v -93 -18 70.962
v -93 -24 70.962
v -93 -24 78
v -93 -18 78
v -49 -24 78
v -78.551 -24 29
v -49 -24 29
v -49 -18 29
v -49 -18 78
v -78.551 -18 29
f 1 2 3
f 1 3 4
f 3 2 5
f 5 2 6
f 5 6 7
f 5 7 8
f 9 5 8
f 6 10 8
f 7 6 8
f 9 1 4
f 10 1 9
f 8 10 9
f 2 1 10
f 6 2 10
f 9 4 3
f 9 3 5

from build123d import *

# Parameters (mm, degrees)
BOX720_W               = 80
BOX720_H               = 6
BOX720_DEPTH           = 20
BOX720_PLACEMENT_ANGLE = 71
BOX727_W               = 44
BOX727_H               = 6
BOX727_DEPTH           = 49


with BuildPart() as krychle720:
    # Box720 → Box720 (new body)
    with BuildSketch(Plane.XY):
        with Locations((40, 3)):
            Rectangle(BOX720_W, BOX720_H)
    extrude(amount=BOX720_DEPTH)


with BuildPart() as krychle720_1:
    # Box720 placement: moved
    add(krychle720.part.moved(Location((-118.17, -24, 82.63))).rotate(Axis((-118.17, -24, 82.63), (0, 1, 0)), BOX720_PLACEMENT_ANGLE))


with BuildPart() as cut532:
    # Box727 → Box727 (new body)
    with BuildSketch(Plane(origin=(-93, -24, 29), x_dir=(1, 0, 0), z_dir=(0, 0, 1))):
        with Locations((22, 3)):
            Rectangle(BOX727_W, BOX727_H)
    extrude(amount=BOX727_DEPTH)

    # Cut532: cut Krychle720
    add(krychle720_1.part, mode=Mode.SUBTRACT)


solid = cut532.part
